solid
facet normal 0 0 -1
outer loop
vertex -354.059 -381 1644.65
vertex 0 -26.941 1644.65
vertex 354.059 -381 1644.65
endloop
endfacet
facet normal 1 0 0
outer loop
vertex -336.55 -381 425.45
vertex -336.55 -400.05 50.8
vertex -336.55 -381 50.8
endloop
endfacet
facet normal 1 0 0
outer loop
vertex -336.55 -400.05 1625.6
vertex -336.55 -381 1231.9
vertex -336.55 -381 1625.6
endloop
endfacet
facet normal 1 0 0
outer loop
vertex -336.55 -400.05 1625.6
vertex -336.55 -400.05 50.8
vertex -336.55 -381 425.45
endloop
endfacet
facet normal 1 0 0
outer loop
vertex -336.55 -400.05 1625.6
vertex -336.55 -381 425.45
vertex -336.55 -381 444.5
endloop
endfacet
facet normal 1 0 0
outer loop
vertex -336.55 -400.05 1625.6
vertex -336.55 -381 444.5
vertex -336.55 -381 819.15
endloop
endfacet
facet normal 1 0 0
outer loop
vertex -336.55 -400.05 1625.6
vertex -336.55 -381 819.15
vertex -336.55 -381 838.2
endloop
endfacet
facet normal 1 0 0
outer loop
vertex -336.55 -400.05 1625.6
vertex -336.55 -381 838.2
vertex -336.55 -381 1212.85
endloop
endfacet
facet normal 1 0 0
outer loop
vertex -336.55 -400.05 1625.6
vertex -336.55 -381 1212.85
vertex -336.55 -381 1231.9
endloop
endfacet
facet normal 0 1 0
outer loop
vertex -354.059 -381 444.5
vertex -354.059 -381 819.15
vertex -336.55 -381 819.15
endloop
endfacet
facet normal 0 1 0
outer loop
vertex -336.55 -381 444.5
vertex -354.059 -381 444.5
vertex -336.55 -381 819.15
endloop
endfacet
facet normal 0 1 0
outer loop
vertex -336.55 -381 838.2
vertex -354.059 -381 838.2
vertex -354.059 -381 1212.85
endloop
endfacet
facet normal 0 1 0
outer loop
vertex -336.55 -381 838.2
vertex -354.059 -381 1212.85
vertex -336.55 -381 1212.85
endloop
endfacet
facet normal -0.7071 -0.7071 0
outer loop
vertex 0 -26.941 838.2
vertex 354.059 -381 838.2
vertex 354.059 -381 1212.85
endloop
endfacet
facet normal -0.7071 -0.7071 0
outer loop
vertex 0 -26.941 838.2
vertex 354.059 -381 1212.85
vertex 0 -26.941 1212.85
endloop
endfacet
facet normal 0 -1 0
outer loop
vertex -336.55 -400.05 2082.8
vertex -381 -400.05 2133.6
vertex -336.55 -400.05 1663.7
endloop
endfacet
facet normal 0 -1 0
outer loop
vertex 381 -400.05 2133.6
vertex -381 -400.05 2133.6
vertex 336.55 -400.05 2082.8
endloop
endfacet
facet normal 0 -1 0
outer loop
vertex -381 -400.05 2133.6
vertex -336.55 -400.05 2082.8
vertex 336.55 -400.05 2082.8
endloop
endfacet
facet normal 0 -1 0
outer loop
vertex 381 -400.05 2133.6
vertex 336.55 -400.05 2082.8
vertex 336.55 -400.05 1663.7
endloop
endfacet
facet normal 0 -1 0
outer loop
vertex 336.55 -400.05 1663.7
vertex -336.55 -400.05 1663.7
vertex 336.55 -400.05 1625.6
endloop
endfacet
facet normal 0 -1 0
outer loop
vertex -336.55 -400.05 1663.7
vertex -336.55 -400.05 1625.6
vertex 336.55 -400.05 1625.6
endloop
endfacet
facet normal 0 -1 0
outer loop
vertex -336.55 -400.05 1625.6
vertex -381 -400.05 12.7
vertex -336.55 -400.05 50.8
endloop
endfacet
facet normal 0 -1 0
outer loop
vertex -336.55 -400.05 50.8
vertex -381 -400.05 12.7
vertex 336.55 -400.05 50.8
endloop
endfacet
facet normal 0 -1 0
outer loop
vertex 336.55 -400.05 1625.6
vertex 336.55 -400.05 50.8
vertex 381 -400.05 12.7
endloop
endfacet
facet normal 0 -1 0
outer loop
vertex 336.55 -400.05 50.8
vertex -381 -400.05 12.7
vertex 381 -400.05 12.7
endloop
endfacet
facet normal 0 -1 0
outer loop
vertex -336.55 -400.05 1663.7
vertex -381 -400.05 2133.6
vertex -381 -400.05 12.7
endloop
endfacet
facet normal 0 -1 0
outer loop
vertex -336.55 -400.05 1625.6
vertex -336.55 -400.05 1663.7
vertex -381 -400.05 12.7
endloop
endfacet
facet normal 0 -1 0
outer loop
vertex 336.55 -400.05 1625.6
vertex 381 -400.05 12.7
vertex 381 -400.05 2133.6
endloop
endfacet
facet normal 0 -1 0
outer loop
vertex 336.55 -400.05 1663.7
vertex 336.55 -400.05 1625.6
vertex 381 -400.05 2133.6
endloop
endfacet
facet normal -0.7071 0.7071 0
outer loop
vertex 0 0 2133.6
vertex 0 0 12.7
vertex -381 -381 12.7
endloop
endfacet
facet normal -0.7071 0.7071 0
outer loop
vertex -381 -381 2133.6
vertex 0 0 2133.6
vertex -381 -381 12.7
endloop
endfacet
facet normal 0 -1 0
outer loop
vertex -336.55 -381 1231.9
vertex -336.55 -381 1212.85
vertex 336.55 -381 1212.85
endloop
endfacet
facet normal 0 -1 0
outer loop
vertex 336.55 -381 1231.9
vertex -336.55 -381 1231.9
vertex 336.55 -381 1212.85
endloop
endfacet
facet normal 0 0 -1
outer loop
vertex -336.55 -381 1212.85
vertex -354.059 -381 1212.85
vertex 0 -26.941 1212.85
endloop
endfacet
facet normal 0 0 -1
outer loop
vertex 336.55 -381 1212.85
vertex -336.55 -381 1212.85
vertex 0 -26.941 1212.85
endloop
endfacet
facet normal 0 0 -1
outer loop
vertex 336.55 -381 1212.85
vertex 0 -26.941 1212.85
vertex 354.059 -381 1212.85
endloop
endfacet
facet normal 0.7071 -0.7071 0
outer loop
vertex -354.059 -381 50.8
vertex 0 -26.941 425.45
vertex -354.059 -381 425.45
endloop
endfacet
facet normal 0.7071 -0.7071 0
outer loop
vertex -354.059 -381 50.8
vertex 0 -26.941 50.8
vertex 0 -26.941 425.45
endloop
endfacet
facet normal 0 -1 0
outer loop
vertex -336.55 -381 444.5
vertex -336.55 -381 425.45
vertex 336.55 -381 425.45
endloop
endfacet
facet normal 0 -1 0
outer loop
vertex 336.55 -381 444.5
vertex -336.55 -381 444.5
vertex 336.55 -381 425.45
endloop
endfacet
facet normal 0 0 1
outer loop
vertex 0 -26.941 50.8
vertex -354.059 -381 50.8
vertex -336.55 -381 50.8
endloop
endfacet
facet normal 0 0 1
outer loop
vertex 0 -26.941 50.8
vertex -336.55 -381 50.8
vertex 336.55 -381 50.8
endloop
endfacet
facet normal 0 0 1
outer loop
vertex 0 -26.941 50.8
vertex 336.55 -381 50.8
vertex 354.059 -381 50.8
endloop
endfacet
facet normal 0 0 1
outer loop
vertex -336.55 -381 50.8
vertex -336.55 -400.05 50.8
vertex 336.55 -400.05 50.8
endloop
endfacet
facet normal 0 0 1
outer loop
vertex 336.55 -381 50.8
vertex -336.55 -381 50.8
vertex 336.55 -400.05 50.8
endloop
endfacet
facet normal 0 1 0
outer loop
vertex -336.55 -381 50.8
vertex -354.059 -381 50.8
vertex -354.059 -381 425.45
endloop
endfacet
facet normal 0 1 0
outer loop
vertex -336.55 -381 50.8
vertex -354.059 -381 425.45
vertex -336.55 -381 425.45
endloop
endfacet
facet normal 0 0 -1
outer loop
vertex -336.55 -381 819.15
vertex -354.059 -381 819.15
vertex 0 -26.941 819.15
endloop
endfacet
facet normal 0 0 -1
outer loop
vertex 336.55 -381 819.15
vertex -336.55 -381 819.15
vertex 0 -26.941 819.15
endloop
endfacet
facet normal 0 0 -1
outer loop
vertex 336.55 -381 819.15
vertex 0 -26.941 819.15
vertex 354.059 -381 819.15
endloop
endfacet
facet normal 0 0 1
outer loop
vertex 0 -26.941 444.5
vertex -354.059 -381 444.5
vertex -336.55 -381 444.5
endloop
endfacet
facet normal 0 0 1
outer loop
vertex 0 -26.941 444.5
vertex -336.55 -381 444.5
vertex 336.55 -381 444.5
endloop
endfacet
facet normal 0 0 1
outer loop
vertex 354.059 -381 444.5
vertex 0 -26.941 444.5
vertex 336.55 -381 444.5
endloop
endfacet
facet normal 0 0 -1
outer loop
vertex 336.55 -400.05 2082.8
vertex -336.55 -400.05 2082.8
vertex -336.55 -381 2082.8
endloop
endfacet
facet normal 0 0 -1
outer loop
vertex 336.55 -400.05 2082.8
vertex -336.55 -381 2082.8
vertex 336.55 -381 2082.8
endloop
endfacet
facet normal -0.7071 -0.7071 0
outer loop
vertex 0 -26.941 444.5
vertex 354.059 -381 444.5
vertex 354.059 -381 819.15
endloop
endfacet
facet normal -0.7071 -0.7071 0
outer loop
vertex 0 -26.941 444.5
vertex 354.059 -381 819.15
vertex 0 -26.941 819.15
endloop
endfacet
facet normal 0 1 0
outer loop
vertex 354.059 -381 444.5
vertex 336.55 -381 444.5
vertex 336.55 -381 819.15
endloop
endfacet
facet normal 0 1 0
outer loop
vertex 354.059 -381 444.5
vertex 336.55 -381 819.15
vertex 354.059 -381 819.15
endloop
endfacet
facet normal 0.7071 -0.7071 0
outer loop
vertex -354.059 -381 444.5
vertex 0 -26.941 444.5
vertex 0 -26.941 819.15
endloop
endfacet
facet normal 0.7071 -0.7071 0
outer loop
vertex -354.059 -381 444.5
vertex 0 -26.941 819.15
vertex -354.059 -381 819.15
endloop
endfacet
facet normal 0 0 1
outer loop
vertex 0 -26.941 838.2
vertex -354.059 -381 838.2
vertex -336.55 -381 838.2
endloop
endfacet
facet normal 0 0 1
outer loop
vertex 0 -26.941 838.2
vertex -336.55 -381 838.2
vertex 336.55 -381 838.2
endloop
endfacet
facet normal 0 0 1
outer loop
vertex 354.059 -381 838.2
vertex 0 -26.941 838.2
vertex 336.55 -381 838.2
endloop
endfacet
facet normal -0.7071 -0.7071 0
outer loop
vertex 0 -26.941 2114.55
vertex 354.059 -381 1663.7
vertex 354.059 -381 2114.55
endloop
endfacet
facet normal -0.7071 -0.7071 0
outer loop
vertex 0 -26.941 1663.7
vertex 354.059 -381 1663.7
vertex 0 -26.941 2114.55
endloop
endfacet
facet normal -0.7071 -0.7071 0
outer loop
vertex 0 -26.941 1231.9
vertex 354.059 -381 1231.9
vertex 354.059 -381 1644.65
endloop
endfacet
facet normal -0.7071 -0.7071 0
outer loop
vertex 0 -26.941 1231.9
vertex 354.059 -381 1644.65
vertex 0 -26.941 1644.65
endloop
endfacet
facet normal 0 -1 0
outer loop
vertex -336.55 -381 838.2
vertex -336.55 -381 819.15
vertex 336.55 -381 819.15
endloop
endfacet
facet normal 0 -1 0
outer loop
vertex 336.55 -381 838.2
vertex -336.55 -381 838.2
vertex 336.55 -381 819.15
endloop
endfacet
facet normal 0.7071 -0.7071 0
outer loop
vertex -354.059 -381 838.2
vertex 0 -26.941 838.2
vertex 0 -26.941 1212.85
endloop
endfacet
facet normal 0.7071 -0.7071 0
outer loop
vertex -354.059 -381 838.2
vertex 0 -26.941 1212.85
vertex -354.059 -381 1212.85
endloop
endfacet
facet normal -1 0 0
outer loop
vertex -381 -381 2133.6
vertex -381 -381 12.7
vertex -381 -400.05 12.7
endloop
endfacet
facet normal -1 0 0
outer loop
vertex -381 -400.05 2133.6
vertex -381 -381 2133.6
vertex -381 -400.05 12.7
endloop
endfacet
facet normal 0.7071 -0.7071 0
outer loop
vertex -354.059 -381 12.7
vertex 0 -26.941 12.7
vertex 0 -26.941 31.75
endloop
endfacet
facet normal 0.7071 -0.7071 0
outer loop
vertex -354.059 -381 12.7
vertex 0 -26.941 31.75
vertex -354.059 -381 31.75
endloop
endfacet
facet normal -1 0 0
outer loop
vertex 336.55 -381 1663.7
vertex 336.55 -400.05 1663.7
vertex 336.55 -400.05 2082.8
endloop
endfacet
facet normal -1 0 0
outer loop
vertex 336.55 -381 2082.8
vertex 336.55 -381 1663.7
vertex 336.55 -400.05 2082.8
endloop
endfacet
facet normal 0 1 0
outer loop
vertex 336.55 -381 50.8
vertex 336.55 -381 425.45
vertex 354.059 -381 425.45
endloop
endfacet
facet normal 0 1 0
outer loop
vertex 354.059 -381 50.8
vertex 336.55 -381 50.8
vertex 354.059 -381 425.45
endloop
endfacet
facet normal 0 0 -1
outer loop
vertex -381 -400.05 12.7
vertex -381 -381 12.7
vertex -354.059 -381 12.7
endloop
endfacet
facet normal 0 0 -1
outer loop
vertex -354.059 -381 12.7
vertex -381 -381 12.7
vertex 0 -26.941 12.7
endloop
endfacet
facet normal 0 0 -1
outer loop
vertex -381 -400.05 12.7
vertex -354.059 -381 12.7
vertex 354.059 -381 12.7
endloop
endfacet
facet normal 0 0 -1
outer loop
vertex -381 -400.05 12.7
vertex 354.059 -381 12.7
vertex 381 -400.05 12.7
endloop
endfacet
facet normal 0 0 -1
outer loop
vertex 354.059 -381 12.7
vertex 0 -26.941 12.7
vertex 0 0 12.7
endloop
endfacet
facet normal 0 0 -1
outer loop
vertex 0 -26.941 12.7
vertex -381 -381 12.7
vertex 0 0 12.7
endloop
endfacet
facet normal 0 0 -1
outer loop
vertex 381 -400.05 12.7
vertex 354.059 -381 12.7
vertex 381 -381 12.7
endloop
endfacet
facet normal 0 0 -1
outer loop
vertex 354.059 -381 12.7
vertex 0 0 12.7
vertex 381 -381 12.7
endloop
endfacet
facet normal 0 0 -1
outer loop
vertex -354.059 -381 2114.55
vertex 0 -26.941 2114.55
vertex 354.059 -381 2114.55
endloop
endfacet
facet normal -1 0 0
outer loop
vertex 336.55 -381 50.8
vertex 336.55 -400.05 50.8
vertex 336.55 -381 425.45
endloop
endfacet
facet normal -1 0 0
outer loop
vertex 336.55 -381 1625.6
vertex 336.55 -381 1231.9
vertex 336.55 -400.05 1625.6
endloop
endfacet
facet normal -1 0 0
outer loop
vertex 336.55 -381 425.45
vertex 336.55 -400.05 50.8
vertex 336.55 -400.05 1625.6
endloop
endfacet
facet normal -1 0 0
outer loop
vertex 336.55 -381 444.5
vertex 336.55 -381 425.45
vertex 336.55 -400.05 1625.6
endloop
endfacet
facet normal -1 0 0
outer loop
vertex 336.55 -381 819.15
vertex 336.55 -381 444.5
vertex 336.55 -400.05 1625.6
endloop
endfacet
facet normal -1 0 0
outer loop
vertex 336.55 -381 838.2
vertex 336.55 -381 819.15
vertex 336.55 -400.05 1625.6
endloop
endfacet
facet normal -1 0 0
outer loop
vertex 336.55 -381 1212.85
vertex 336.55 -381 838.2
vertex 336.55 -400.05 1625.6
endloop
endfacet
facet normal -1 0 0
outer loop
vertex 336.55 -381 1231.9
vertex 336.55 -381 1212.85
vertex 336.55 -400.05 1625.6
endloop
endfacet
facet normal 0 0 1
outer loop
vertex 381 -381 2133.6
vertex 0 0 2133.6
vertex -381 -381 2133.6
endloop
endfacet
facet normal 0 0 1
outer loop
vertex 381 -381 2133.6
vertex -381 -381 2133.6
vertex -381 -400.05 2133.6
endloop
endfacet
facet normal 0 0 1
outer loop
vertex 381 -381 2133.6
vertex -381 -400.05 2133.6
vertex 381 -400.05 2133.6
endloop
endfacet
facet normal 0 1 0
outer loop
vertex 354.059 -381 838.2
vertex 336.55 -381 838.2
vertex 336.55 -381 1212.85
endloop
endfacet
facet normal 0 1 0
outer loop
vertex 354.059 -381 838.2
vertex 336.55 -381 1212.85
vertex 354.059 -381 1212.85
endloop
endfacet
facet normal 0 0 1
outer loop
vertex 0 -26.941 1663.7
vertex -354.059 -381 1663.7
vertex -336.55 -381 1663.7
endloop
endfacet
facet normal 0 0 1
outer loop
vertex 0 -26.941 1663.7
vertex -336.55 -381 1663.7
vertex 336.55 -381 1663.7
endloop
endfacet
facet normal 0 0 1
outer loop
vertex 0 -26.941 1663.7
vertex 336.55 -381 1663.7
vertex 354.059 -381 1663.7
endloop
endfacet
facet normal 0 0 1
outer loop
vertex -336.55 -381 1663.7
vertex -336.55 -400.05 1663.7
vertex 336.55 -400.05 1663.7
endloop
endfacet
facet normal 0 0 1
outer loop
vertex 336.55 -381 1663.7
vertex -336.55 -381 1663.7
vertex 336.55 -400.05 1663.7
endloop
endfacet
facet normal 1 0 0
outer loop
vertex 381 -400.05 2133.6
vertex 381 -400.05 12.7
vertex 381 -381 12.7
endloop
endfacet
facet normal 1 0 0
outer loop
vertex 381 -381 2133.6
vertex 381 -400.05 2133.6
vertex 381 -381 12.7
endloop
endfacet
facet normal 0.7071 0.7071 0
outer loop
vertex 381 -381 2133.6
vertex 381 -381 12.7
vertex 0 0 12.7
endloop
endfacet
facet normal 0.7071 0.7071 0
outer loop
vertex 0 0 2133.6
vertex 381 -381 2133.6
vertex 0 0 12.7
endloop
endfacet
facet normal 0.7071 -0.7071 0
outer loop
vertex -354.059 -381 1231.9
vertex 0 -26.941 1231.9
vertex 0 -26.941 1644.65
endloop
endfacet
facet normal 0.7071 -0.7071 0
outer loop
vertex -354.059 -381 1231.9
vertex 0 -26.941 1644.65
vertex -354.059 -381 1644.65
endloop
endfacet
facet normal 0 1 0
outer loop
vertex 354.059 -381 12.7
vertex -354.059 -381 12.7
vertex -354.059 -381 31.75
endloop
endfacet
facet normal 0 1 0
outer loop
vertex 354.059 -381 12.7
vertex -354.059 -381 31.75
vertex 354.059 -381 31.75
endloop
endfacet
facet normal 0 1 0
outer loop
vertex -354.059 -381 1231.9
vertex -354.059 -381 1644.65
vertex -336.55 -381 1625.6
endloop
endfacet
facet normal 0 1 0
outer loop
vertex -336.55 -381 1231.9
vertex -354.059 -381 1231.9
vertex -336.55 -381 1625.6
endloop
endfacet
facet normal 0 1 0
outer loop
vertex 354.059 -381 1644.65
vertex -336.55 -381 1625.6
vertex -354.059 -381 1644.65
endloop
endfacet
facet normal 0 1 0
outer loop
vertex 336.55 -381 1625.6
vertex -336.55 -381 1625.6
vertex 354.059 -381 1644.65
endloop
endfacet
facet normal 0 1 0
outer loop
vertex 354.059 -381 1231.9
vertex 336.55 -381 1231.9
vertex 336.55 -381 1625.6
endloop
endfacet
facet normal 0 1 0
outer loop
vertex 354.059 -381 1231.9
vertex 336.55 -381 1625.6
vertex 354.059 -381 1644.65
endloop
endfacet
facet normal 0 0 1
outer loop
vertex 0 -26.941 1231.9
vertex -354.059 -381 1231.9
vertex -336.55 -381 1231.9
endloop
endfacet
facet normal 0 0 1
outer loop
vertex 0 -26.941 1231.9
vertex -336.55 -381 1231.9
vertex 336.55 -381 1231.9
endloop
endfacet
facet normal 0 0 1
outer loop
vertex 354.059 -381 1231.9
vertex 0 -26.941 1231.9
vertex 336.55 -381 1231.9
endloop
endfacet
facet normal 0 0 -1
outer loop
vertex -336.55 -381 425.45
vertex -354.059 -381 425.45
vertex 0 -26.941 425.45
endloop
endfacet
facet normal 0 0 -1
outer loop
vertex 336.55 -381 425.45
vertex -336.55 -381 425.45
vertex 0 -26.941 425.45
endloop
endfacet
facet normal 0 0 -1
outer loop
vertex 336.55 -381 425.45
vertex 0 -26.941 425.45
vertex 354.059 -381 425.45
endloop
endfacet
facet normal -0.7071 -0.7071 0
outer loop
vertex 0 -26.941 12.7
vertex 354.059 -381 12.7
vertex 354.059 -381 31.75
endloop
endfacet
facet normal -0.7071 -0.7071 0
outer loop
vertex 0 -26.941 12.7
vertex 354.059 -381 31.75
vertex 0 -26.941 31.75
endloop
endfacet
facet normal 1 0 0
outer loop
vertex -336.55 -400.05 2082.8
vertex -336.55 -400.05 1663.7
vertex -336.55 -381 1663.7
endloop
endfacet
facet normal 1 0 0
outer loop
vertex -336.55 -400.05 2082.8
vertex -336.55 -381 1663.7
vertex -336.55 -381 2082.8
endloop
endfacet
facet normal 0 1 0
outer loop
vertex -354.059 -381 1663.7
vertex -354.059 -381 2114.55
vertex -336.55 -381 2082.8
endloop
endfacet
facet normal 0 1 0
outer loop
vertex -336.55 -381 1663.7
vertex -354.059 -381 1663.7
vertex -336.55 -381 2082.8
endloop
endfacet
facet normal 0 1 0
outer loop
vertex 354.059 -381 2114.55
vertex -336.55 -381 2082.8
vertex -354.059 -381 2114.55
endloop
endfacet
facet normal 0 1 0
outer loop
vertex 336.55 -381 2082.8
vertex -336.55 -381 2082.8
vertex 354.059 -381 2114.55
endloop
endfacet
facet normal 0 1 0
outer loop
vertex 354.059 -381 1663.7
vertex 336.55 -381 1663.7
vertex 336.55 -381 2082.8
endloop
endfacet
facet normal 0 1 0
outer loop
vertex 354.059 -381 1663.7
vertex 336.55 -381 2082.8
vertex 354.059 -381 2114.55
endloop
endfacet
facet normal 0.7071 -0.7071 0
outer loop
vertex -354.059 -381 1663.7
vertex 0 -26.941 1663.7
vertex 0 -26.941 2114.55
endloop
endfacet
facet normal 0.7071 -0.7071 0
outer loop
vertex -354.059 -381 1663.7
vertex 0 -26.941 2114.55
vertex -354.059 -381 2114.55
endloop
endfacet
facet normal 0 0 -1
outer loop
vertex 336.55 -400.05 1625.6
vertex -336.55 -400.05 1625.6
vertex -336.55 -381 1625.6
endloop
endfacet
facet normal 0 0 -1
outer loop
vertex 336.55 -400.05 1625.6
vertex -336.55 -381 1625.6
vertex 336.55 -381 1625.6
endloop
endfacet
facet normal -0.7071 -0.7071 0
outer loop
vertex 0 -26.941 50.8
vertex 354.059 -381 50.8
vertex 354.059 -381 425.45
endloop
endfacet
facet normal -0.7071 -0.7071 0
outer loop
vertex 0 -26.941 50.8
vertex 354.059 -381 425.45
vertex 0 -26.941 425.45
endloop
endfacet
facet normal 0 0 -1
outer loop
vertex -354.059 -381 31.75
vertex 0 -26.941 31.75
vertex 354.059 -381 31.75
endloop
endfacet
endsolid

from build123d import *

# Parameters (mm, degrees)
F1_DEPTH  = 2133.6
F2_DEPTH  = 2133.6
F3_DEPTH  = 2133.6
F4_DEPTH  = 1905
F5_W      = 673.1
F5_H      = 419.1
F5_H_2    = 1574.8
F6_DEPTH  = 19.05
F7_DEPTH  = 209.55
F8_DEPTH  = 1663.7
F9_DEPTH  = 1644.65
F10_DEPTH = 1231.9
F11_DEPTH = 1212.85
F12_DEPTH = 787.4
F13_DEPTH = 768.35
F14_DEPTH = 393.7
F15_DEPTH = 374.65
F16_DEPTH = 50.8
F17_DEPTH = 31.75
F18_DEPTH = 50.8
F19_DEPTH = 50.8
F20_DEPTH = 50.8
F21_DEPTH = 50.8
F22_DEPTH = 12.7


with BuildPart() as f1:
    # F0 (on Top) → F1 (new body)
    with BuildSketch(Plane.XY):
        Polygon((-354.0592090795, -381), (-380.9999747663, -381), (-380.9999747663, -400.05), (381.0000252337, -400.05), (381.0000252337, -381), (354.0592559783, -381), align=None)
    extrude(amount=F1_DEPTH)

    # F0 (on Top) → F2 (join)
    with BuildSketch(Plane.XY):
        Polygon((381.0000252337, -381), (0, 0), (0, -26.9407674711), (354.0592559783, -381), align=None)
        Polygon((0, 0), (-380.9999747663, -381), (-354.0592090795, -381), (0, -26.9407674711), align=None)
    extrude(amount=F2_DEPTH)

    # F0 (on Top) → F3 (join)
    with BuildSketch(Plane.XY):
        Polygon((0, -26.9407674711), (-354.0592090795, -381), (354.0592559783, -381), align=None)
    extrude(amount=F3_DEPTH)

    # F0 (on Top) → F4 (cut)
    with BuildSketch(Plane.XY):
        Polygon((0, -26.9407674711), (-354.0592090795, -381), (354.0592559783, -381), align=None)
    extrude(amount=F4_DEPTH, mode=Mode.SUBTRACT)

    # F5 (on face) → F6 (cut)
    with BuildSketch(Plane.XZ.offset(400.05)):
        with Locations((2.52337e-05, 1873.25)):
            Rectangle(F5_W, F5_H)
        with Locations((2.52337e-05, 838.2)):
            Rectangle(F5_W, F5_H_2)
    extrude(amount=-F6_DEPTH, mode=Mode.SUBTRACT)

    # F7 (cut): a face of the model
    f7_faces = [f1.faces().sort_by_distance(p)[0] for p in [
        (1.56329e-05, -262.9802558237, 1905),
    ]]
    extrude(f7_faces, amount=-F7_DEPTH, mode=Mode.SUBTRACT)

    # F0 (on Top) → F8 (join)
    with BuildSketch(Plane.XY):
        Polygon((0, -26.9407674711), (-354.0592090795, -381), (354.0592559783, -381), align=None)
    extrude(amount=F8_DEPTH)

    # F0 (on Top) → F9 (cut)
    with BuildSketch(Plane.XY):
        Polygon((0, -26.9407674711), (-354.0592090795, -381), (354.0592559783, -381), align=None)
    extrude(amount=F9_DEPTH, mode=Mode.SUBTRACT)

    # F0 (on Top) → F10 (join)
    with BuildSketch(Plane.XY):
        Polygon((0, -26.9407674711), (-354.0592090795, -381), (354.0592559783, -381), align=None)
    extrude(amount=F10_DEPTH)

    # F0 (on Top) → F11 (cut)
    with BuildSketch(Plane.XY):
        Polygon((0, -26.9407674711), (-354.0592090795, -381), (354.0592559783, -381), align=None)
    extrude(amount=F11_DEPTH, mode=Mode.SUBTRACT)

    # F0 (on Top) → F12 (join)
    with BuildSketch(Plane.XY):
        Polygon((0, -26.9407674711), (-354.0592090795, -381), (354.0592559783, -381), align=None)
    extrude(amount=F12_DEPTH)

    # F0 (on Top) → F13 (cut)
    with BuildSketch(Plane.XY):
        Polygon((0, -26.9407674711), (-354.0592090795, -381), (354.0592559783, -381), align=None)
    extrude(amount=F13_DEPTH, mode=Mode.SUBTRACT)

    # F0 (on Top) → F14 (join)
    with BuildSketch(Plane.XY):
        Polygon((0, -26.9407674711), (-354.0592090795, -381), (354.0592559783, -381), align=None)
    extrude(amount=F14_DEPTH)

    # F0 (on Top) → F15 (cut)
    with BuildSketch(Plane.XY):
        Polygon((0, -26.9407674711), (-354.0592090795, -381), (354.0592559783, -381), align=None)
    extrude(amount=F15_DEPTH, mode=Mode.SUBTRACT)

    # F0 (on Top) → F16 (join)
    with BuildSketch(Plane.XY):
        Polygon((0, -26.9407674711), (-354.0592090795, -381), (354.0592559783, -381), align=None)
    extrude(amount=F16_DEPTH)

    # F0 (on Top) → F17 (cut)
    with BuildSketch(Plane.XY):
        Polygon((0, -26.9407674711), (-354.0592090795, -381), (354.0592559783, -381), align=None)
    extrude(amount=F17_DEPTH, mode=Mode.SUBTRACT)

    # F18 (add): a face of the model
    f18_faces = [f1.faces().sort_by_distance(p)[0] for p in [
        (1.56329e-05, -262.9802558237, 787.4),
    ]]
    extrude(f18_faces, amount=F18_DEPTH)

    # F19 (cut): a face of the model
    f19_faces = [f1.faces().sort_by_distance(p)[0] for p in [
        (1.56329e-05, -262.9802558237, 768.35),
    ]]
    extrude(f19_faces, amount=-F19_DEPTH, mode=Mode.SUBTRACT)

    # F20 (add): a face of the model
    f20_faces = [f1.faces().sort_by_distance(p)[0] for p in [
        (1.56329e-05, -262.9802558237, 393.7),
    ]]
    extrude(f20_faces, amount=F20_DEPTH)

    # F21 (cut): a face of the model
    f21_faces = [f1.faces().sort_by_distance(p)[0] for p in [
        (1.56329e-05, -262.9802558237, 374.65),
    ]]
    extrude(f21_faces, amount=-F21_DEPTH, mode=Mode.SUBTRACT)

    # F0 (on Top) → F22 (cut)
    with BuildSketch(Plane.XY):
        Polygon((381.0000252337, -381), (0, 0), (0, -26.9407674711), (354.0592559783, -381), align=None)
        Polygon((0, 0), (-380.9999747663, -381), (-354.0592090795, -381), (0, -26.9407674711), align=None)
        Polygon((-354.0592090795, -381), (-380.9999747663, -381), (-380.9999747663, -400.05), (381.0000252337, -400.05), (381.0000252337, -381), (354.0592559783, -381), align=None)
    extrude(amount=F22_DEPTH, mode=Mode.SUBTRACT)


solid = f1.part
